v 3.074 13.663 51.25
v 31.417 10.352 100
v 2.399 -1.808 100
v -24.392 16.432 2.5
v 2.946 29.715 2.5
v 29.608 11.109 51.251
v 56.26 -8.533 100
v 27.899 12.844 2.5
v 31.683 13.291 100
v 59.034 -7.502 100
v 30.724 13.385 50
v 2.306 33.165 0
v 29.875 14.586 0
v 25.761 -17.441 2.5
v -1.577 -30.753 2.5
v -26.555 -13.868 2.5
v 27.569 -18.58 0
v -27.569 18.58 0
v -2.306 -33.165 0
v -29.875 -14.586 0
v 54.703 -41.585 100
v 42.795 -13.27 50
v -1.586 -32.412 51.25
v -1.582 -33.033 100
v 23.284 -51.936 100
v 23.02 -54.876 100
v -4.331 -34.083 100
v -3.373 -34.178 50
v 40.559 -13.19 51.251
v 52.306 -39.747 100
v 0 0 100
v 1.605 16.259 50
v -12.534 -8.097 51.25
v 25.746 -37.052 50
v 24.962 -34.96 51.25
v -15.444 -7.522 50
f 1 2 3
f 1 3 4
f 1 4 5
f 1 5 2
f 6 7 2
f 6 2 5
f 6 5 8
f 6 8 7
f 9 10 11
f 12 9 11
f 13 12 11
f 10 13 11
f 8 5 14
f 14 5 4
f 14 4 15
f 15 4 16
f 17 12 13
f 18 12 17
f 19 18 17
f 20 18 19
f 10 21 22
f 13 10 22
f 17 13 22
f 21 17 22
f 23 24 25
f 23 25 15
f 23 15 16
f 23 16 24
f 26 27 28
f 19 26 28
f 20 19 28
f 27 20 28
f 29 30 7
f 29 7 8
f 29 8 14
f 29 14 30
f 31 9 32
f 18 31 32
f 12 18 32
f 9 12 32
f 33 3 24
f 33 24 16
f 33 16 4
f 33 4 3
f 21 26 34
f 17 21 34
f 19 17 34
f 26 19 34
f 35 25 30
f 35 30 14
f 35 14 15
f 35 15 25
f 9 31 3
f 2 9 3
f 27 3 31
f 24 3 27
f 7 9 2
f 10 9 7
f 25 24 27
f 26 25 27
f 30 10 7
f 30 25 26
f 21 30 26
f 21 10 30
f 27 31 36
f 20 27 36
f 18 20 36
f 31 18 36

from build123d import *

# Parameters (mm, degrees)
F4_T = -2.5


with BuildPart() as f3:
    # F2 (on offset) → F3 section 0
    with BuildSketch(Plane.XY.offset(100)):
        Polygon((31.682645, 13.290587), (0, 0), (-4.331336, -34.083269), (23.019972, -54.875951), (54.702617, -41.585363), (59.033954, -7.502094), align=None)
    # F1 (on Top) → F3 section 1
    with BuildSketch(Plane.XY):
        Polygon((-27.569018, 18.579667), (-29.874973, -14.585637), (-2.305955, -33.165304), (27.569018, -18.579667), (29.874973, 14.585637), (2.305955, 33.165304), align=None)
    loft()

    # F4
    f4_openings = [f3.faces().sort_by_distance(p)[0] for p in [
        (27.351309, -20.792682, 100),
    ]]
    offset(amount=F4_T, openings=f4_openings)


solid = f3.part
